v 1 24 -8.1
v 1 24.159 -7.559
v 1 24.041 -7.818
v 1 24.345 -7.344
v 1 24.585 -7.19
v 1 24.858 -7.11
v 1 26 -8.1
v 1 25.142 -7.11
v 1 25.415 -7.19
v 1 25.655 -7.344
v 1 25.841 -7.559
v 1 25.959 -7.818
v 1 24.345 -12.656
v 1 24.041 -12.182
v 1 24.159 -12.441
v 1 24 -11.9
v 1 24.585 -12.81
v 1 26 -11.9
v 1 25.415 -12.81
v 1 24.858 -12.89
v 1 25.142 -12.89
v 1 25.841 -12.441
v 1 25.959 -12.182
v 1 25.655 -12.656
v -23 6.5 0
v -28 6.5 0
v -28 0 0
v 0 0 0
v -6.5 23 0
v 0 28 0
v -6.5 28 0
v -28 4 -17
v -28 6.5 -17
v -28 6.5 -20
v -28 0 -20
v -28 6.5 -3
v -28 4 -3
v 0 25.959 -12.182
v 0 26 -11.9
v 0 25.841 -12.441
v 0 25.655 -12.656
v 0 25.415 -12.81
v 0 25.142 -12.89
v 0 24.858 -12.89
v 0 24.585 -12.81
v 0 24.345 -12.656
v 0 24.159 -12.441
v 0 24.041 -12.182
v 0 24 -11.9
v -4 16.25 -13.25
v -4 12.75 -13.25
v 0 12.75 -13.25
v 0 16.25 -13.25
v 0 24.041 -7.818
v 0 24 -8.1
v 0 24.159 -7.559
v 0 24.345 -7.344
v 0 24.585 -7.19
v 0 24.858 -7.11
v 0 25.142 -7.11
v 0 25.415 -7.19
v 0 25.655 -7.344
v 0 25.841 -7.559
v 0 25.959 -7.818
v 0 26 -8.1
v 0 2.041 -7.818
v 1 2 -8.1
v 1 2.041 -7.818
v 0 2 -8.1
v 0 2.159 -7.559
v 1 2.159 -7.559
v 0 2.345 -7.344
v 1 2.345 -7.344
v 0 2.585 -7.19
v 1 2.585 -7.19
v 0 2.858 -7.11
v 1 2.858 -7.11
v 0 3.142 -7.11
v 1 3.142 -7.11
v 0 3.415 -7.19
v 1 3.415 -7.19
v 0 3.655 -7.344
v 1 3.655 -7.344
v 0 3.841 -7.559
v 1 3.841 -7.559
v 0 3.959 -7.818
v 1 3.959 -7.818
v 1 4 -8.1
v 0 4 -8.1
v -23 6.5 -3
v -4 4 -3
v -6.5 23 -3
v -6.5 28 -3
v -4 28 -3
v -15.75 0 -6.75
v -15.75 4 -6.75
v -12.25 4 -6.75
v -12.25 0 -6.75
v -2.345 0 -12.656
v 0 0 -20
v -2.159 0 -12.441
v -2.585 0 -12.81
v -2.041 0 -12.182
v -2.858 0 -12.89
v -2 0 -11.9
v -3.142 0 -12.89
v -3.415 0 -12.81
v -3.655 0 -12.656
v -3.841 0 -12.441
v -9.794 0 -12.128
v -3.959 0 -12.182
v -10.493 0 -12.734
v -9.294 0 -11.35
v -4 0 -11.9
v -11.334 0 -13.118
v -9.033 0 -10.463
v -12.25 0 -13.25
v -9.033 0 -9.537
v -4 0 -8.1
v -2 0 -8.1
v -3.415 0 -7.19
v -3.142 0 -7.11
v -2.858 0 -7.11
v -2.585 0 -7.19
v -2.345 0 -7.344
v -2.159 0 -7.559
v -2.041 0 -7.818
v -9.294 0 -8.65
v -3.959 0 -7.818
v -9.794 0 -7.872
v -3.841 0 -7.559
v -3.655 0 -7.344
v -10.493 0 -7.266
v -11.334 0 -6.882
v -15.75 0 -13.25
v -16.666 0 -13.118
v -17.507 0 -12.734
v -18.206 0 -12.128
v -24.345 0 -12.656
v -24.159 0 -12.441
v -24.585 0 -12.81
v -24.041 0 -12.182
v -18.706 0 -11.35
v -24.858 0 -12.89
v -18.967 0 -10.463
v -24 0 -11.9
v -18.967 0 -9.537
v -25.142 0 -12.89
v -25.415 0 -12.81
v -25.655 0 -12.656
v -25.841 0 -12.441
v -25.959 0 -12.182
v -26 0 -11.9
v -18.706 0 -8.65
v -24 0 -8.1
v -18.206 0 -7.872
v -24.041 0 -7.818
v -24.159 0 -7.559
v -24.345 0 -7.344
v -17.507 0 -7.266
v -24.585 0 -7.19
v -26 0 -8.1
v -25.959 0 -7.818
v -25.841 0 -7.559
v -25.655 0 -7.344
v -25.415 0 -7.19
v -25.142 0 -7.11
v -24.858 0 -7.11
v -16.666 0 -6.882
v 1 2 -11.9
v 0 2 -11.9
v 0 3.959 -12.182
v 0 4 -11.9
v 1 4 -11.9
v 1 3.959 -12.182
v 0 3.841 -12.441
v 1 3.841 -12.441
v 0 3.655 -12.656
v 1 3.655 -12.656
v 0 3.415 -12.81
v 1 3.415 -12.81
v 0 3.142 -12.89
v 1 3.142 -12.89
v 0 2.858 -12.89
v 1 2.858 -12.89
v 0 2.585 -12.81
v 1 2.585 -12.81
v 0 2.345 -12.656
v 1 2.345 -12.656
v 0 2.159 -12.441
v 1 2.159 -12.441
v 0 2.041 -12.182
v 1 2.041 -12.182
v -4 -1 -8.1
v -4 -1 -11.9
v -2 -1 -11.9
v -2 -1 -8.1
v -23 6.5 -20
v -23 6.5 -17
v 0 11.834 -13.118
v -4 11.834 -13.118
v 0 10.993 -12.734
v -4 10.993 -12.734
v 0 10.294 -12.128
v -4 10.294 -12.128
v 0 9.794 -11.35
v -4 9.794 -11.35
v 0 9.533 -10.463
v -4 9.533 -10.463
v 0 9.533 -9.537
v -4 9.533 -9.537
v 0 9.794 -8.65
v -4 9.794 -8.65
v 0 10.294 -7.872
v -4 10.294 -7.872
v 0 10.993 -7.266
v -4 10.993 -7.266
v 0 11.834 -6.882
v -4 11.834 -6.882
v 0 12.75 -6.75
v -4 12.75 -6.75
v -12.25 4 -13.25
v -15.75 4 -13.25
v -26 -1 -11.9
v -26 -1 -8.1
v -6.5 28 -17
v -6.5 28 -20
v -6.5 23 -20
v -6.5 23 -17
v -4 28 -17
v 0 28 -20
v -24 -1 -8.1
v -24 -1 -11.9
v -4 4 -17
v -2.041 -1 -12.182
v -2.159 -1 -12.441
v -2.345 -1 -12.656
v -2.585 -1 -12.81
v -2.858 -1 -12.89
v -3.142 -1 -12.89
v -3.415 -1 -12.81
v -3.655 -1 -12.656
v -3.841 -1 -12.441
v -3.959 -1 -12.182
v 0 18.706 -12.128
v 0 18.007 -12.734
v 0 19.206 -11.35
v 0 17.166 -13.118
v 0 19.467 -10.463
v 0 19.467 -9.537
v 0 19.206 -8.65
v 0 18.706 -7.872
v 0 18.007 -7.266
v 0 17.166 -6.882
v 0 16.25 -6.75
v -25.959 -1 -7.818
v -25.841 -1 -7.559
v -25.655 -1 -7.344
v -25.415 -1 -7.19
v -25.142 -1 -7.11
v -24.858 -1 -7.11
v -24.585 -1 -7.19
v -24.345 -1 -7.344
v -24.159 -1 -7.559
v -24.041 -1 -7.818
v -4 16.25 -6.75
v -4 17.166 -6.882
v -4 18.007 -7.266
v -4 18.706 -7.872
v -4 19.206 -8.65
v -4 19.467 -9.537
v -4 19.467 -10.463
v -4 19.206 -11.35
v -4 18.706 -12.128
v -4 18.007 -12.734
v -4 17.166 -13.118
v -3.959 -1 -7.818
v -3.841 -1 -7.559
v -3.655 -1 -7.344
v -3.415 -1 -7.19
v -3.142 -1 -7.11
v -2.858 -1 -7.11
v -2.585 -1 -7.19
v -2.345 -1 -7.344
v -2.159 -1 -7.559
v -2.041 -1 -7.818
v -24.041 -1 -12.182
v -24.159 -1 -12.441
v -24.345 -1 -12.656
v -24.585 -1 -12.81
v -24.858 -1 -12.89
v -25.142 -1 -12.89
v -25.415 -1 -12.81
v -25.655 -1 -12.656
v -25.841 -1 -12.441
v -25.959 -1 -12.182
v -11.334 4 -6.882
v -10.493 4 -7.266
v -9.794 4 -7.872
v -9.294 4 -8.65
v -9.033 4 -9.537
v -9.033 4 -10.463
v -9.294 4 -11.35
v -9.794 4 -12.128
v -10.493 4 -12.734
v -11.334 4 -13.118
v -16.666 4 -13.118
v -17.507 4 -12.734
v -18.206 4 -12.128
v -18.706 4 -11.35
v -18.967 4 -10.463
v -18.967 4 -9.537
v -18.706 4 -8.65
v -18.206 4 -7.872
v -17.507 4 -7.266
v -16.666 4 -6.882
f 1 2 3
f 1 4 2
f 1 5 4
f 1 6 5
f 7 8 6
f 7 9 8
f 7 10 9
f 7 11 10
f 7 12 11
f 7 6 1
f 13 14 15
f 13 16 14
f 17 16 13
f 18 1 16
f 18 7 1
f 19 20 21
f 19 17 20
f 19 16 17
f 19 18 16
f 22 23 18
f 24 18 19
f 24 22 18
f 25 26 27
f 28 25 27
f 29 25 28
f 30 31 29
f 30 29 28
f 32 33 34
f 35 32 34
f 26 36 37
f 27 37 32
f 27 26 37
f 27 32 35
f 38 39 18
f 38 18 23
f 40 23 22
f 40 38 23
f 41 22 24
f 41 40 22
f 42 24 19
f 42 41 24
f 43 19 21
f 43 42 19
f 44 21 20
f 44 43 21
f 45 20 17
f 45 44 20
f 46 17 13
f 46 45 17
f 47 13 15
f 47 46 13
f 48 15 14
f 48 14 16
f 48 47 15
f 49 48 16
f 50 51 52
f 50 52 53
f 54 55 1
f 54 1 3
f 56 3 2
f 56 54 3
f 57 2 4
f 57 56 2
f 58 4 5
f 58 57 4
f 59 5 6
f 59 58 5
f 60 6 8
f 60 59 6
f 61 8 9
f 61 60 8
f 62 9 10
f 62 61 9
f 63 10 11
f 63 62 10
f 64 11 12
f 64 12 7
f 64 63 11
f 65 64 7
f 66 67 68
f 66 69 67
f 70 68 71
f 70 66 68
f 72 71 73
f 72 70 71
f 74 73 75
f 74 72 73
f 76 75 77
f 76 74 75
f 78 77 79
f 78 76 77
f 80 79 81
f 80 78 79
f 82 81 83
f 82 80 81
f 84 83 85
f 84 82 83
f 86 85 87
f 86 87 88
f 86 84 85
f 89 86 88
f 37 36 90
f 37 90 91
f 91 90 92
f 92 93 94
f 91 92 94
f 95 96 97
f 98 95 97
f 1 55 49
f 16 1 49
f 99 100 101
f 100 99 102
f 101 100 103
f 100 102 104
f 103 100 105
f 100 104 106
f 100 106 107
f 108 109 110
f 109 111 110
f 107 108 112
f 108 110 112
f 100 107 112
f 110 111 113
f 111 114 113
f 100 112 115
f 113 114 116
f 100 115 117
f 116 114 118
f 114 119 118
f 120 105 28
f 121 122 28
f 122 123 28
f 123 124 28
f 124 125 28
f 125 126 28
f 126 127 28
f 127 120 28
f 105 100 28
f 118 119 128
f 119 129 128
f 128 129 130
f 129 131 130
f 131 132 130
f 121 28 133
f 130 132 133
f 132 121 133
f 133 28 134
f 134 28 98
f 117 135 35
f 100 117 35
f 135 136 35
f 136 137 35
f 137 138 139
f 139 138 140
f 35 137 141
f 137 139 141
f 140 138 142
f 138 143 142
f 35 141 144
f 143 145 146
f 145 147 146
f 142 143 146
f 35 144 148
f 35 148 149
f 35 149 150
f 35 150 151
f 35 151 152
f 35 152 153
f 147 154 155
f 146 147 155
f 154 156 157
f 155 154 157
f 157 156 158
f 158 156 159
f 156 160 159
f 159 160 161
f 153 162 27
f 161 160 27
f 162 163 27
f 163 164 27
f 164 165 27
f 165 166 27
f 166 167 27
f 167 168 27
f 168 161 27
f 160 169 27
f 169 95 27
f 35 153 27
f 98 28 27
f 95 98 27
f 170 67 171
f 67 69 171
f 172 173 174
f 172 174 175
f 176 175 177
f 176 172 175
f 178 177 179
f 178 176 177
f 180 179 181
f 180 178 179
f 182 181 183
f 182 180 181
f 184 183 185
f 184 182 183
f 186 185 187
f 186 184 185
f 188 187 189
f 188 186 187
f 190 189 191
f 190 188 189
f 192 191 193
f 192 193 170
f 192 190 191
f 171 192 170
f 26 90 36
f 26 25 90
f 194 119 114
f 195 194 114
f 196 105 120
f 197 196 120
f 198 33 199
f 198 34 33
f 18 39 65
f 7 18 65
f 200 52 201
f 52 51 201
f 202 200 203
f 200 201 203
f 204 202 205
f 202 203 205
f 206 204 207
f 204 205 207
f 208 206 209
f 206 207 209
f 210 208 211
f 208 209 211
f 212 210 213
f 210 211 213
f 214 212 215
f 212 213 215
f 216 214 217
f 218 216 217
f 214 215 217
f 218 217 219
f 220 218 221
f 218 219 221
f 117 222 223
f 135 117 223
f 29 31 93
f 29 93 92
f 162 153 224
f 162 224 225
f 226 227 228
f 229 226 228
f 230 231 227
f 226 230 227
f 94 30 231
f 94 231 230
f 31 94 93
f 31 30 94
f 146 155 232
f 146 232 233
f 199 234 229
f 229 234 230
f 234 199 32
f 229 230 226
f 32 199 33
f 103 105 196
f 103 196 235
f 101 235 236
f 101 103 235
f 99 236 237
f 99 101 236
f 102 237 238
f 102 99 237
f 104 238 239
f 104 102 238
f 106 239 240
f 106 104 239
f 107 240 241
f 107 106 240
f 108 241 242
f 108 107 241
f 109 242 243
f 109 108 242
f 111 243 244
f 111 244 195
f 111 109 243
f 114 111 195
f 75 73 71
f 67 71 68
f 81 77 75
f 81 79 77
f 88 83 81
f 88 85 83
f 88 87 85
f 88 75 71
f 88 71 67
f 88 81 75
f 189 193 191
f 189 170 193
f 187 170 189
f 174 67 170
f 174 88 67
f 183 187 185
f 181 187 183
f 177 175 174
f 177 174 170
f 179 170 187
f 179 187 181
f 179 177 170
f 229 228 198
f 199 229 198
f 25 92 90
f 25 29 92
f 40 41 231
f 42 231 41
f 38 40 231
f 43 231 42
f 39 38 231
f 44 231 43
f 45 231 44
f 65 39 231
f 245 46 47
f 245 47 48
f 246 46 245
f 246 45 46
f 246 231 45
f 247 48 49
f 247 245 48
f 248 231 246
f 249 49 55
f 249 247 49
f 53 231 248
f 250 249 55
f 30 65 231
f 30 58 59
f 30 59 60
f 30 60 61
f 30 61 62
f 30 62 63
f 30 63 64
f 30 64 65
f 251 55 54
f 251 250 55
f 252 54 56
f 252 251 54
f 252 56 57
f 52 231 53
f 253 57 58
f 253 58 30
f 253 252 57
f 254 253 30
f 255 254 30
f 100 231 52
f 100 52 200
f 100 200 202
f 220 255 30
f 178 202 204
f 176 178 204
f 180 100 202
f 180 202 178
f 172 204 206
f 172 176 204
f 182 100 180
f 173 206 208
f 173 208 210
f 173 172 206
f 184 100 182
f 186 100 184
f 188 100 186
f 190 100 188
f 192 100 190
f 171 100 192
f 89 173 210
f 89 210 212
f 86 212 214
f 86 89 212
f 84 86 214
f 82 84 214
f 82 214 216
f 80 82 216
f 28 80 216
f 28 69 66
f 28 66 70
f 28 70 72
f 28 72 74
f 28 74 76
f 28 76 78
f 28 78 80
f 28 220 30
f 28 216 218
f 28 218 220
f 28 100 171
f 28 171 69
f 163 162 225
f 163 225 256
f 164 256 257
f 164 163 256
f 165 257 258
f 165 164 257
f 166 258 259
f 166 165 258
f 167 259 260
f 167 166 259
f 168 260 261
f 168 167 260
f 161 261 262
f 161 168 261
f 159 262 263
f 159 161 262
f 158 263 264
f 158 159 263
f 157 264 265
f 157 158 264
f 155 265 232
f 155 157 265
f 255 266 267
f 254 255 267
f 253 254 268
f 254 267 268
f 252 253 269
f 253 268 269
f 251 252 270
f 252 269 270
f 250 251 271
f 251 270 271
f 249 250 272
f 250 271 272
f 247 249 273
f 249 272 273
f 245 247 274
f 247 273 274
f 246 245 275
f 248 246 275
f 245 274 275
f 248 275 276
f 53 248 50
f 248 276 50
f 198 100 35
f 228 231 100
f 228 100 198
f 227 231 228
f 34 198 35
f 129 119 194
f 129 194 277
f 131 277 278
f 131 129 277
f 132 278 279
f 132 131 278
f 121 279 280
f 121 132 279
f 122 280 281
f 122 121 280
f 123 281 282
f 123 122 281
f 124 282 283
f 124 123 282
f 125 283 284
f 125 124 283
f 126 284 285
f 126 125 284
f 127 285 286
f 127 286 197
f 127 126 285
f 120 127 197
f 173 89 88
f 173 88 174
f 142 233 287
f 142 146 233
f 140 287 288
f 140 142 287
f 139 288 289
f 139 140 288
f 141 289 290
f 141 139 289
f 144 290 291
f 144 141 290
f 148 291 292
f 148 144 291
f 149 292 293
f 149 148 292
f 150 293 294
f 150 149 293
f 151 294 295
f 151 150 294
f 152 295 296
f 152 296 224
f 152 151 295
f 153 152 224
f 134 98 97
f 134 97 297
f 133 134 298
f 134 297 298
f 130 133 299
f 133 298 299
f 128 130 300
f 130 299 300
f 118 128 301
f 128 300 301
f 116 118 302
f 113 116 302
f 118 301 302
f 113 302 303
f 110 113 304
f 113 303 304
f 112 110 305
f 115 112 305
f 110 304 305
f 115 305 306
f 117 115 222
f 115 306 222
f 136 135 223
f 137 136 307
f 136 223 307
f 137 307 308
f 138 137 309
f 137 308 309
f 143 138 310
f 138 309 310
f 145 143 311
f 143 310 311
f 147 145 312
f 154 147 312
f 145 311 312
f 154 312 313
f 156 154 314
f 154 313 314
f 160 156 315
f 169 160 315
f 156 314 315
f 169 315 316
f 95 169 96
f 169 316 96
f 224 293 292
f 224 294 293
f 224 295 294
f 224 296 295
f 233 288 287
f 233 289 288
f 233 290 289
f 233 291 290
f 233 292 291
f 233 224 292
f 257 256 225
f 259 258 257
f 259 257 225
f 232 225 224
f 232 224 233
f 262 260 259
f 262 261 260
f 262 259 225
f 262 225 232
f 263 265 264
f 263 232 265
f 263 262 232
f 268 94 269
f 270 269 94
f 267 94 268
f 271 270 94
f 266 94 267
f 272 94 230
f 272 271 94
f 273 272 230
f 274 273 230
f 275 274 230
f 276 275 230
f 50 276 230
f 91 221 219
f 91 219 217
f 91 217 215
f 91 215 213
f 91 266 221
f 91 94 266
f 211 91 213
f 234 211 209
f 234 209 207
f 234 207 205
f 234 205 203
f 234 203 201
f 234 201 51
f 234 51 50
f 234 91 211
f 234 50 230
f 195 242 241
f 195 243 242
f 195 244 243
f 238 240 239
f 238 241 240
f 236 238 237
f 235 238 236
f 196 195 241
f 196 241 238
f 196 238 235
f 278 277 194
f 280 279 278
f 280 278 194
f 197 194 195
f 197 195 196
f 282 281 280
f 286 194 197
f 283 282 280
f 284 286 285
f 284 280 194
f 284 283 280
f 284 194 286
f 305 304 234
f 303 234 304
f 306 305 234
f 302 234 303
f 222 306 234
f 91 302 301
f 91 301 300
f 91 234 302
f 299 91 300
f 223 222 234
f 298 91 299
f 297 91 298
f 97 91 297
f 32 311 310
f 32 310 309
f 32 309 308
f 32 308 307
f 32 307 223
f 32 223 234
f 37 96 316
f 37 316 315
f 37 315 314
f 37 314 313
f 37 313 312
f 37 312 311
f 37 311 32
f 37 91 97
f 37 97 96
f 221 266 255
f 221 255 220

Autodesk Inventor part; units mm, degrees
ref_plane "YZ Plane" through (0, 0, 0) normal (1, 0, 0) x (0, 1, 0)
ref_plane "XZ Plane" through (0, 0, 0) normal (0, 1, 0) x (-1, 0, 0)
ref_plane "XY Plane" through (0, 0, 0) normal (0, 0, 1) x (1, 0, 0)
sketch "Sketch1" plane through (0, 0, 0) normal (0, 1, 0) x (-1, 0, 0)
  line L0 (0, 0) -> (28, 0)
  line L1 (28, 0) -> (28, -20)
  line L2 (28, -20) -> (0, -20)
  line L3 (0, -20) -> (0, 0)
  dimension "d0" = 28
  dimension "d1" = 20
extrude "Extrusion1" add sketch "Sketch1" along normal blind 4
sketch "Sketch2" plane through (0, 4, 0) normal (0, 1, 0) x (1, 0, 0)
  line L0 (0, 20) -> (-28, 20) projected
  line L1 (-28, 20) -> (-28, 0) projected
  line L2 (-28, 0) -> (0, 0) projected
  line L3 (0, 0) -> (0, 20) projected
  line L4 (0, 0) -> (-4, 0)
  line L5 (-4, 0) -> (-4, 20)
  line L6 (-4, 20) -> (0, 20)
  line L7 (0, 20) -> (0, 0)
  dimension "d4" = 4
extrude "Extrusion2" add sketch "Sketch2" along normal blind 24 contours L3 L2 L5 L0
sketch "Sketch3" plane through (-4, 4, -20) normal (-1, 0, 0) x (0, 0, 1)
  line L0 (20, -4) -> (0, -4) projected
  line L1 (0, -4) -> (0, 24) projected
  line L2 (20, 24) -> (0, 24) projected
  line L3 (20, -4) -> (20, 24) projected
  line L4 (0, -4) -> (0, 24) projected
  line L5 (10, 15.5) -> (10, 15.5)
  line L6 (13.25, 12.25) -> (13.25, 8.75)
  line L7 (10, 5.5) -> (10, 5.5)
  line L8 (6.75, 8.75) -> (6.75, 12.25)
  line L9 (6.75, 15.5) -> (13.25, 5.5) construction
  line L10 (13.25, 15.5) -> (6.75, 5.5) construction
  arc A0 (10, 5.5) -> (13.25, 8.75) centre (10, 8.75) ccw
  arc A1 (6.75, 8.75) -> (10, 5.5) centre (10, 8.75) ccw
  arc A2 (13.25, 12.25) -> (10, 15.5) centre (10, 12.25) ccw
  arc A3 (10, 15.5) -> (6.75, 12.25) centre (10, 12.25) ccw
  point P0 (10, 10.5)
  point P1 (10, 15.5)
  dimension "d7" = 6.5
  dimension "d8" = 10
  dimension "d9" = 3.25
  dimension "d10" = 3.25
  dimension "d11" = 3.25
extrude "Extrusion3" cut sketch "Sketch3" against normal blind 4 contours L6 A0 A1 L8 A3 A2
sketch "Sketch4" plane through (0, 4, 0) normal (0, 1, 0) x (1, 0, 0)
  line L0 (0, 20) -> (-28, 20) projected
  line L1 (0, 0) -> (0, 20) projected
  line L2 (-28, 0) -> (0, 0) projected
  line L3 (-28, 20) -> (-28, 0) projected
  line L4 (-15.75, 6.75) -> (-12.25, 6.75)
  line L5 (-9, 10) -> (-9, 10)
  line L6 (-12.25, 13.25) -> (-15.75, 13.25)
  line L7 (-19, 10) -> (-19, 10)
  line L8 (-19, 6.75) -> (-9, 13.25) construction
  line L9 (-9, 6.75) -> (-19, 13.25) construction
  arc A0 (-9, 10) -> (-12.25, 13.25) centre (-12.25, 10) ccw
  arc A1 (-12.25, 6.75) -> (-9, 10) centre (-12.25, 10) ccw
  arc A2 (-15.75, 13.25) -> (-19, 10) centre (-15.75, 10) ccw
  arc A3 (-19, 10) -> (-15.75, 6.75) centre (-15.75, 10) ccw
  point P0 (-14, 10)
  dimension "d14" = 10
  dimension "d15" = 6.5
  dimension "d16" = 3.25
extrude "Extrusion4" cut sketch "Sketch4" against normal blind 4 contours A3 A2 L6 A0 A1 L4
sketch "Sketch5" plane through (0, 0, -20) normal (0, 0, -1) x (-1, 0, 0)
  line L0 (0, 0) -> (28, 0) projected
  line L1 (28, 0) -> (28, 4) projected
  line L2 (4, 4) -> (28, 4) projected
  line L3 (4, 4) -> (4, 28) projected
  line L4 (0, 28) -> (4, 28) projected
  line L5 (0, 0) -> (0, 28) projected
  line L6 (0, 28) -> (6.5, 28)
  line L7 (28, 0) -> (28, 6.5)
  line L8 (28, 6.5) -> (23, 6.5)
  line L9 (6.5, 28) -> (6.5, 23)
  line L10 (6.5, 23) -> (23, 6.5)
  dimension "d19" = 6.5
  dimension "d20" = 6.5
  dimension "d21" = 5
  dimension "d22" = 5
extrude "Extrusion5" add sketch "Sketch5" against normal blind 3 contours L2 L3 L6 L9 L10 L8 L7
sketch "Sketch6" plane through (-28, 0, 0) normal (0, 0, 1) x (1, 0, 0)
  line L0 (21.5, 23) -> (5, 6.5) projected
  line L1 (5, 6.5) -> (0, 6.5) projected
  line L2 (0, 6.5) -> (0, 4) projected
  line L3 (24, 4) -> (0, 4) projected
  line L4 (24, 28) -> (24, 4) projected
  line L5 (24, 28) -> (21.5, 28) projected
  line L6 (21.5, 28) -> (21.5, 23) projected
  line L7 (0, 0) -> (28, 0) projected
  line L8 (28, 0) -> (28, 28) projected
  line L9 (24, 28) -> (28, 28) projected
  line L10 (24, 4) -> (24, 28) projected
  line L11 (0, 4) -> (24, 4) projected
  line L12 (0, 0) -> (0, 4) projected
extrude "Extrusion6" add sketch "Sketch6" against normal blind 3 contours L6 L5 L4 L3 L2 L1 L0
sketch "Sketch7" plane through (0, 0, 0) normal (1, 0, 0) x (0, 0, -1)
  line L0 (3, 4) -> (17, 4) projected
  line L1 (10, 4) -> (10, 3)
  line L2 (8.1, 2) -> (11.9, 2)
  line L3 (12.9, 3) -> (12.9, 3)
  line L4 (11.9, 4) -> (8.1, 4)
  line L5 (7.1, 3) -> (7.1, 3)
  line L6 (7.1, 2) -> (12.9, 4) construction
  line L7 (12.9, 2) -> (7.1, 4) construction
  arc A0 (8.1, 4) -> (7.1, 3) centre (8.1, 3) ccw
  arc A1 (7.1, 3) -> (8.1, 2) centre (8.1, 3) ccw
  arc A2 (12.9, 3) -> (11.9, 4) centre (11.9, 3) ccw
  arc A3 (11.9, 2) -> (12.9, 3) centre (11.9, 3) ccw
  point P0 (0, 0)
  dimension "d27" = 1
  dimension "d28" = 5.8
  dimension "d29" = 1
extrude "Extrusion7" add sketch "Sketch7" along normal blind 1
sketch "Sketch8" plane through (0, 0, 0) normal (0, -1, 0) x (1, 0, 0)
  line L0 (-4, -3) -> (-4, -17) projected
  line L1 (-4, -10) -> (-3, -10)
  line L2 (-3, -7.1) -> (-3, -7.1)
  line L3 (-4, -8.1) -> (-4, -11.9)
  line L4 (-3, -12.9) -> (-3, -12.9)
  line L5 (-2, -11.9) -> (-2, -8.1)
  line L6 (-2, -7.1) -> (-4, -12.9) construction
  line L7 (-4, -7.1) -> (-2, -12.9) construction
  arc A0 (-4, -11.9) -> (-3, -12.9) centre (-3, -11.9) ccw
  arc A1 (-3, -12.9) -> (-2, -11.9) centre (-3, -11.9) ccw
  arc A2 (-2, -8.1) -> (-3, -7.1) centre (-3, -8.1) ccw
  arc A3 (-3, -7.1) -> (-4, -8.1) centre (-3, -8.1) ccw
  point P0 (0, 0)
  dimension "d32" = 1
  dimension "d33" = 5.8
  dimension "d34" = 1
extrude "Extrusion8" add sketch "Sketch8" along normal blind 1
sketch "Sketch9" plane through (0, 0, 0) normal (0, -1, 0) x (1, 0, 0)
  line L0 (-28, -20) -> (-28, 0) projected
  line L1 (-28, -10) -> (-25, -10)
  line L2 (-25, -12.9) -> (-25, -12.9)
  line L3 (-26, -11.9) -> (-26, -8.1)
  line L4 (-25, -7.1) -> (-25, -7.1)
  line L5 (-24, -8.1) -> (-24, -11.9)
  line L6 (-24, -12.9) -> (-26, -7.1) construction
  line L7 (-26, -12.9) -> (-24, -7.1) construction
  arc A0 (-26, -11.9) -> (-25, -12.9) centre (-25, -11.9) ccw
  arc A1 (-25, -7.1) -> (-26, -8.1) centre (-25, -8.1) ccw
  arc A2 (-24, -8.1) -> (-25, -7.1) centre (-25, -8.1) ccw
  arc A3 (-25, -12.9) -> (-24, -11.9) centre (-25, -11.9) ccw
  point P0 (0, 0)
  dimension "d37" = 3
  dimension "d38" = 2
  dimension "d39" = 5.8
  dimension "d40" = 1
extrude "Extrusion9" add sketch "Sketch9" along normal blind 1
sketch "Sketch10" plane through (0, 0, 0) normal (1, 0, 0) x (0, 0, -1)
  line L0 (17, 28) -> (3, 28) projected
  line L1 (10, 28) -> (10, 25)
  line L2 (8.1, 24) -> (11.9, 24)
  line L3 (12.9, 25) -> (12.9, 25)
  line L4 (11.9, 26) -> (8.1, 26)
  line L5 (7.1, 25) -> (7.1, 25)
  line L6 (7.1, 24) -> (12.9, 26) construction
  line L7 (12.9, 24) -> (7.1, 26) construction
  arc A0 (8.1, 26) -> (7.1, 25) centre (8.1, 25) ccw
  arc A1 (12.9, 25) -> (11.9, 26) centre (11.9, 25) ccw
  arc A2 (11.9, 24) -> (12.9, 25) centre (11.9, 25) ccw
  arc A3 (7.1, 25) -> (8.1, 24) centre (8.1, 25) ccw
  point P0 (0, 0)
  dimension "d43" = 3
  dimension "d44" = 5.8
  dimension "d45" = 2
  dimension "d46" = 1
extrude "Extrusion10" add sketch "Sketch10" along normal blind 1
properties part number "CORNER2028"
